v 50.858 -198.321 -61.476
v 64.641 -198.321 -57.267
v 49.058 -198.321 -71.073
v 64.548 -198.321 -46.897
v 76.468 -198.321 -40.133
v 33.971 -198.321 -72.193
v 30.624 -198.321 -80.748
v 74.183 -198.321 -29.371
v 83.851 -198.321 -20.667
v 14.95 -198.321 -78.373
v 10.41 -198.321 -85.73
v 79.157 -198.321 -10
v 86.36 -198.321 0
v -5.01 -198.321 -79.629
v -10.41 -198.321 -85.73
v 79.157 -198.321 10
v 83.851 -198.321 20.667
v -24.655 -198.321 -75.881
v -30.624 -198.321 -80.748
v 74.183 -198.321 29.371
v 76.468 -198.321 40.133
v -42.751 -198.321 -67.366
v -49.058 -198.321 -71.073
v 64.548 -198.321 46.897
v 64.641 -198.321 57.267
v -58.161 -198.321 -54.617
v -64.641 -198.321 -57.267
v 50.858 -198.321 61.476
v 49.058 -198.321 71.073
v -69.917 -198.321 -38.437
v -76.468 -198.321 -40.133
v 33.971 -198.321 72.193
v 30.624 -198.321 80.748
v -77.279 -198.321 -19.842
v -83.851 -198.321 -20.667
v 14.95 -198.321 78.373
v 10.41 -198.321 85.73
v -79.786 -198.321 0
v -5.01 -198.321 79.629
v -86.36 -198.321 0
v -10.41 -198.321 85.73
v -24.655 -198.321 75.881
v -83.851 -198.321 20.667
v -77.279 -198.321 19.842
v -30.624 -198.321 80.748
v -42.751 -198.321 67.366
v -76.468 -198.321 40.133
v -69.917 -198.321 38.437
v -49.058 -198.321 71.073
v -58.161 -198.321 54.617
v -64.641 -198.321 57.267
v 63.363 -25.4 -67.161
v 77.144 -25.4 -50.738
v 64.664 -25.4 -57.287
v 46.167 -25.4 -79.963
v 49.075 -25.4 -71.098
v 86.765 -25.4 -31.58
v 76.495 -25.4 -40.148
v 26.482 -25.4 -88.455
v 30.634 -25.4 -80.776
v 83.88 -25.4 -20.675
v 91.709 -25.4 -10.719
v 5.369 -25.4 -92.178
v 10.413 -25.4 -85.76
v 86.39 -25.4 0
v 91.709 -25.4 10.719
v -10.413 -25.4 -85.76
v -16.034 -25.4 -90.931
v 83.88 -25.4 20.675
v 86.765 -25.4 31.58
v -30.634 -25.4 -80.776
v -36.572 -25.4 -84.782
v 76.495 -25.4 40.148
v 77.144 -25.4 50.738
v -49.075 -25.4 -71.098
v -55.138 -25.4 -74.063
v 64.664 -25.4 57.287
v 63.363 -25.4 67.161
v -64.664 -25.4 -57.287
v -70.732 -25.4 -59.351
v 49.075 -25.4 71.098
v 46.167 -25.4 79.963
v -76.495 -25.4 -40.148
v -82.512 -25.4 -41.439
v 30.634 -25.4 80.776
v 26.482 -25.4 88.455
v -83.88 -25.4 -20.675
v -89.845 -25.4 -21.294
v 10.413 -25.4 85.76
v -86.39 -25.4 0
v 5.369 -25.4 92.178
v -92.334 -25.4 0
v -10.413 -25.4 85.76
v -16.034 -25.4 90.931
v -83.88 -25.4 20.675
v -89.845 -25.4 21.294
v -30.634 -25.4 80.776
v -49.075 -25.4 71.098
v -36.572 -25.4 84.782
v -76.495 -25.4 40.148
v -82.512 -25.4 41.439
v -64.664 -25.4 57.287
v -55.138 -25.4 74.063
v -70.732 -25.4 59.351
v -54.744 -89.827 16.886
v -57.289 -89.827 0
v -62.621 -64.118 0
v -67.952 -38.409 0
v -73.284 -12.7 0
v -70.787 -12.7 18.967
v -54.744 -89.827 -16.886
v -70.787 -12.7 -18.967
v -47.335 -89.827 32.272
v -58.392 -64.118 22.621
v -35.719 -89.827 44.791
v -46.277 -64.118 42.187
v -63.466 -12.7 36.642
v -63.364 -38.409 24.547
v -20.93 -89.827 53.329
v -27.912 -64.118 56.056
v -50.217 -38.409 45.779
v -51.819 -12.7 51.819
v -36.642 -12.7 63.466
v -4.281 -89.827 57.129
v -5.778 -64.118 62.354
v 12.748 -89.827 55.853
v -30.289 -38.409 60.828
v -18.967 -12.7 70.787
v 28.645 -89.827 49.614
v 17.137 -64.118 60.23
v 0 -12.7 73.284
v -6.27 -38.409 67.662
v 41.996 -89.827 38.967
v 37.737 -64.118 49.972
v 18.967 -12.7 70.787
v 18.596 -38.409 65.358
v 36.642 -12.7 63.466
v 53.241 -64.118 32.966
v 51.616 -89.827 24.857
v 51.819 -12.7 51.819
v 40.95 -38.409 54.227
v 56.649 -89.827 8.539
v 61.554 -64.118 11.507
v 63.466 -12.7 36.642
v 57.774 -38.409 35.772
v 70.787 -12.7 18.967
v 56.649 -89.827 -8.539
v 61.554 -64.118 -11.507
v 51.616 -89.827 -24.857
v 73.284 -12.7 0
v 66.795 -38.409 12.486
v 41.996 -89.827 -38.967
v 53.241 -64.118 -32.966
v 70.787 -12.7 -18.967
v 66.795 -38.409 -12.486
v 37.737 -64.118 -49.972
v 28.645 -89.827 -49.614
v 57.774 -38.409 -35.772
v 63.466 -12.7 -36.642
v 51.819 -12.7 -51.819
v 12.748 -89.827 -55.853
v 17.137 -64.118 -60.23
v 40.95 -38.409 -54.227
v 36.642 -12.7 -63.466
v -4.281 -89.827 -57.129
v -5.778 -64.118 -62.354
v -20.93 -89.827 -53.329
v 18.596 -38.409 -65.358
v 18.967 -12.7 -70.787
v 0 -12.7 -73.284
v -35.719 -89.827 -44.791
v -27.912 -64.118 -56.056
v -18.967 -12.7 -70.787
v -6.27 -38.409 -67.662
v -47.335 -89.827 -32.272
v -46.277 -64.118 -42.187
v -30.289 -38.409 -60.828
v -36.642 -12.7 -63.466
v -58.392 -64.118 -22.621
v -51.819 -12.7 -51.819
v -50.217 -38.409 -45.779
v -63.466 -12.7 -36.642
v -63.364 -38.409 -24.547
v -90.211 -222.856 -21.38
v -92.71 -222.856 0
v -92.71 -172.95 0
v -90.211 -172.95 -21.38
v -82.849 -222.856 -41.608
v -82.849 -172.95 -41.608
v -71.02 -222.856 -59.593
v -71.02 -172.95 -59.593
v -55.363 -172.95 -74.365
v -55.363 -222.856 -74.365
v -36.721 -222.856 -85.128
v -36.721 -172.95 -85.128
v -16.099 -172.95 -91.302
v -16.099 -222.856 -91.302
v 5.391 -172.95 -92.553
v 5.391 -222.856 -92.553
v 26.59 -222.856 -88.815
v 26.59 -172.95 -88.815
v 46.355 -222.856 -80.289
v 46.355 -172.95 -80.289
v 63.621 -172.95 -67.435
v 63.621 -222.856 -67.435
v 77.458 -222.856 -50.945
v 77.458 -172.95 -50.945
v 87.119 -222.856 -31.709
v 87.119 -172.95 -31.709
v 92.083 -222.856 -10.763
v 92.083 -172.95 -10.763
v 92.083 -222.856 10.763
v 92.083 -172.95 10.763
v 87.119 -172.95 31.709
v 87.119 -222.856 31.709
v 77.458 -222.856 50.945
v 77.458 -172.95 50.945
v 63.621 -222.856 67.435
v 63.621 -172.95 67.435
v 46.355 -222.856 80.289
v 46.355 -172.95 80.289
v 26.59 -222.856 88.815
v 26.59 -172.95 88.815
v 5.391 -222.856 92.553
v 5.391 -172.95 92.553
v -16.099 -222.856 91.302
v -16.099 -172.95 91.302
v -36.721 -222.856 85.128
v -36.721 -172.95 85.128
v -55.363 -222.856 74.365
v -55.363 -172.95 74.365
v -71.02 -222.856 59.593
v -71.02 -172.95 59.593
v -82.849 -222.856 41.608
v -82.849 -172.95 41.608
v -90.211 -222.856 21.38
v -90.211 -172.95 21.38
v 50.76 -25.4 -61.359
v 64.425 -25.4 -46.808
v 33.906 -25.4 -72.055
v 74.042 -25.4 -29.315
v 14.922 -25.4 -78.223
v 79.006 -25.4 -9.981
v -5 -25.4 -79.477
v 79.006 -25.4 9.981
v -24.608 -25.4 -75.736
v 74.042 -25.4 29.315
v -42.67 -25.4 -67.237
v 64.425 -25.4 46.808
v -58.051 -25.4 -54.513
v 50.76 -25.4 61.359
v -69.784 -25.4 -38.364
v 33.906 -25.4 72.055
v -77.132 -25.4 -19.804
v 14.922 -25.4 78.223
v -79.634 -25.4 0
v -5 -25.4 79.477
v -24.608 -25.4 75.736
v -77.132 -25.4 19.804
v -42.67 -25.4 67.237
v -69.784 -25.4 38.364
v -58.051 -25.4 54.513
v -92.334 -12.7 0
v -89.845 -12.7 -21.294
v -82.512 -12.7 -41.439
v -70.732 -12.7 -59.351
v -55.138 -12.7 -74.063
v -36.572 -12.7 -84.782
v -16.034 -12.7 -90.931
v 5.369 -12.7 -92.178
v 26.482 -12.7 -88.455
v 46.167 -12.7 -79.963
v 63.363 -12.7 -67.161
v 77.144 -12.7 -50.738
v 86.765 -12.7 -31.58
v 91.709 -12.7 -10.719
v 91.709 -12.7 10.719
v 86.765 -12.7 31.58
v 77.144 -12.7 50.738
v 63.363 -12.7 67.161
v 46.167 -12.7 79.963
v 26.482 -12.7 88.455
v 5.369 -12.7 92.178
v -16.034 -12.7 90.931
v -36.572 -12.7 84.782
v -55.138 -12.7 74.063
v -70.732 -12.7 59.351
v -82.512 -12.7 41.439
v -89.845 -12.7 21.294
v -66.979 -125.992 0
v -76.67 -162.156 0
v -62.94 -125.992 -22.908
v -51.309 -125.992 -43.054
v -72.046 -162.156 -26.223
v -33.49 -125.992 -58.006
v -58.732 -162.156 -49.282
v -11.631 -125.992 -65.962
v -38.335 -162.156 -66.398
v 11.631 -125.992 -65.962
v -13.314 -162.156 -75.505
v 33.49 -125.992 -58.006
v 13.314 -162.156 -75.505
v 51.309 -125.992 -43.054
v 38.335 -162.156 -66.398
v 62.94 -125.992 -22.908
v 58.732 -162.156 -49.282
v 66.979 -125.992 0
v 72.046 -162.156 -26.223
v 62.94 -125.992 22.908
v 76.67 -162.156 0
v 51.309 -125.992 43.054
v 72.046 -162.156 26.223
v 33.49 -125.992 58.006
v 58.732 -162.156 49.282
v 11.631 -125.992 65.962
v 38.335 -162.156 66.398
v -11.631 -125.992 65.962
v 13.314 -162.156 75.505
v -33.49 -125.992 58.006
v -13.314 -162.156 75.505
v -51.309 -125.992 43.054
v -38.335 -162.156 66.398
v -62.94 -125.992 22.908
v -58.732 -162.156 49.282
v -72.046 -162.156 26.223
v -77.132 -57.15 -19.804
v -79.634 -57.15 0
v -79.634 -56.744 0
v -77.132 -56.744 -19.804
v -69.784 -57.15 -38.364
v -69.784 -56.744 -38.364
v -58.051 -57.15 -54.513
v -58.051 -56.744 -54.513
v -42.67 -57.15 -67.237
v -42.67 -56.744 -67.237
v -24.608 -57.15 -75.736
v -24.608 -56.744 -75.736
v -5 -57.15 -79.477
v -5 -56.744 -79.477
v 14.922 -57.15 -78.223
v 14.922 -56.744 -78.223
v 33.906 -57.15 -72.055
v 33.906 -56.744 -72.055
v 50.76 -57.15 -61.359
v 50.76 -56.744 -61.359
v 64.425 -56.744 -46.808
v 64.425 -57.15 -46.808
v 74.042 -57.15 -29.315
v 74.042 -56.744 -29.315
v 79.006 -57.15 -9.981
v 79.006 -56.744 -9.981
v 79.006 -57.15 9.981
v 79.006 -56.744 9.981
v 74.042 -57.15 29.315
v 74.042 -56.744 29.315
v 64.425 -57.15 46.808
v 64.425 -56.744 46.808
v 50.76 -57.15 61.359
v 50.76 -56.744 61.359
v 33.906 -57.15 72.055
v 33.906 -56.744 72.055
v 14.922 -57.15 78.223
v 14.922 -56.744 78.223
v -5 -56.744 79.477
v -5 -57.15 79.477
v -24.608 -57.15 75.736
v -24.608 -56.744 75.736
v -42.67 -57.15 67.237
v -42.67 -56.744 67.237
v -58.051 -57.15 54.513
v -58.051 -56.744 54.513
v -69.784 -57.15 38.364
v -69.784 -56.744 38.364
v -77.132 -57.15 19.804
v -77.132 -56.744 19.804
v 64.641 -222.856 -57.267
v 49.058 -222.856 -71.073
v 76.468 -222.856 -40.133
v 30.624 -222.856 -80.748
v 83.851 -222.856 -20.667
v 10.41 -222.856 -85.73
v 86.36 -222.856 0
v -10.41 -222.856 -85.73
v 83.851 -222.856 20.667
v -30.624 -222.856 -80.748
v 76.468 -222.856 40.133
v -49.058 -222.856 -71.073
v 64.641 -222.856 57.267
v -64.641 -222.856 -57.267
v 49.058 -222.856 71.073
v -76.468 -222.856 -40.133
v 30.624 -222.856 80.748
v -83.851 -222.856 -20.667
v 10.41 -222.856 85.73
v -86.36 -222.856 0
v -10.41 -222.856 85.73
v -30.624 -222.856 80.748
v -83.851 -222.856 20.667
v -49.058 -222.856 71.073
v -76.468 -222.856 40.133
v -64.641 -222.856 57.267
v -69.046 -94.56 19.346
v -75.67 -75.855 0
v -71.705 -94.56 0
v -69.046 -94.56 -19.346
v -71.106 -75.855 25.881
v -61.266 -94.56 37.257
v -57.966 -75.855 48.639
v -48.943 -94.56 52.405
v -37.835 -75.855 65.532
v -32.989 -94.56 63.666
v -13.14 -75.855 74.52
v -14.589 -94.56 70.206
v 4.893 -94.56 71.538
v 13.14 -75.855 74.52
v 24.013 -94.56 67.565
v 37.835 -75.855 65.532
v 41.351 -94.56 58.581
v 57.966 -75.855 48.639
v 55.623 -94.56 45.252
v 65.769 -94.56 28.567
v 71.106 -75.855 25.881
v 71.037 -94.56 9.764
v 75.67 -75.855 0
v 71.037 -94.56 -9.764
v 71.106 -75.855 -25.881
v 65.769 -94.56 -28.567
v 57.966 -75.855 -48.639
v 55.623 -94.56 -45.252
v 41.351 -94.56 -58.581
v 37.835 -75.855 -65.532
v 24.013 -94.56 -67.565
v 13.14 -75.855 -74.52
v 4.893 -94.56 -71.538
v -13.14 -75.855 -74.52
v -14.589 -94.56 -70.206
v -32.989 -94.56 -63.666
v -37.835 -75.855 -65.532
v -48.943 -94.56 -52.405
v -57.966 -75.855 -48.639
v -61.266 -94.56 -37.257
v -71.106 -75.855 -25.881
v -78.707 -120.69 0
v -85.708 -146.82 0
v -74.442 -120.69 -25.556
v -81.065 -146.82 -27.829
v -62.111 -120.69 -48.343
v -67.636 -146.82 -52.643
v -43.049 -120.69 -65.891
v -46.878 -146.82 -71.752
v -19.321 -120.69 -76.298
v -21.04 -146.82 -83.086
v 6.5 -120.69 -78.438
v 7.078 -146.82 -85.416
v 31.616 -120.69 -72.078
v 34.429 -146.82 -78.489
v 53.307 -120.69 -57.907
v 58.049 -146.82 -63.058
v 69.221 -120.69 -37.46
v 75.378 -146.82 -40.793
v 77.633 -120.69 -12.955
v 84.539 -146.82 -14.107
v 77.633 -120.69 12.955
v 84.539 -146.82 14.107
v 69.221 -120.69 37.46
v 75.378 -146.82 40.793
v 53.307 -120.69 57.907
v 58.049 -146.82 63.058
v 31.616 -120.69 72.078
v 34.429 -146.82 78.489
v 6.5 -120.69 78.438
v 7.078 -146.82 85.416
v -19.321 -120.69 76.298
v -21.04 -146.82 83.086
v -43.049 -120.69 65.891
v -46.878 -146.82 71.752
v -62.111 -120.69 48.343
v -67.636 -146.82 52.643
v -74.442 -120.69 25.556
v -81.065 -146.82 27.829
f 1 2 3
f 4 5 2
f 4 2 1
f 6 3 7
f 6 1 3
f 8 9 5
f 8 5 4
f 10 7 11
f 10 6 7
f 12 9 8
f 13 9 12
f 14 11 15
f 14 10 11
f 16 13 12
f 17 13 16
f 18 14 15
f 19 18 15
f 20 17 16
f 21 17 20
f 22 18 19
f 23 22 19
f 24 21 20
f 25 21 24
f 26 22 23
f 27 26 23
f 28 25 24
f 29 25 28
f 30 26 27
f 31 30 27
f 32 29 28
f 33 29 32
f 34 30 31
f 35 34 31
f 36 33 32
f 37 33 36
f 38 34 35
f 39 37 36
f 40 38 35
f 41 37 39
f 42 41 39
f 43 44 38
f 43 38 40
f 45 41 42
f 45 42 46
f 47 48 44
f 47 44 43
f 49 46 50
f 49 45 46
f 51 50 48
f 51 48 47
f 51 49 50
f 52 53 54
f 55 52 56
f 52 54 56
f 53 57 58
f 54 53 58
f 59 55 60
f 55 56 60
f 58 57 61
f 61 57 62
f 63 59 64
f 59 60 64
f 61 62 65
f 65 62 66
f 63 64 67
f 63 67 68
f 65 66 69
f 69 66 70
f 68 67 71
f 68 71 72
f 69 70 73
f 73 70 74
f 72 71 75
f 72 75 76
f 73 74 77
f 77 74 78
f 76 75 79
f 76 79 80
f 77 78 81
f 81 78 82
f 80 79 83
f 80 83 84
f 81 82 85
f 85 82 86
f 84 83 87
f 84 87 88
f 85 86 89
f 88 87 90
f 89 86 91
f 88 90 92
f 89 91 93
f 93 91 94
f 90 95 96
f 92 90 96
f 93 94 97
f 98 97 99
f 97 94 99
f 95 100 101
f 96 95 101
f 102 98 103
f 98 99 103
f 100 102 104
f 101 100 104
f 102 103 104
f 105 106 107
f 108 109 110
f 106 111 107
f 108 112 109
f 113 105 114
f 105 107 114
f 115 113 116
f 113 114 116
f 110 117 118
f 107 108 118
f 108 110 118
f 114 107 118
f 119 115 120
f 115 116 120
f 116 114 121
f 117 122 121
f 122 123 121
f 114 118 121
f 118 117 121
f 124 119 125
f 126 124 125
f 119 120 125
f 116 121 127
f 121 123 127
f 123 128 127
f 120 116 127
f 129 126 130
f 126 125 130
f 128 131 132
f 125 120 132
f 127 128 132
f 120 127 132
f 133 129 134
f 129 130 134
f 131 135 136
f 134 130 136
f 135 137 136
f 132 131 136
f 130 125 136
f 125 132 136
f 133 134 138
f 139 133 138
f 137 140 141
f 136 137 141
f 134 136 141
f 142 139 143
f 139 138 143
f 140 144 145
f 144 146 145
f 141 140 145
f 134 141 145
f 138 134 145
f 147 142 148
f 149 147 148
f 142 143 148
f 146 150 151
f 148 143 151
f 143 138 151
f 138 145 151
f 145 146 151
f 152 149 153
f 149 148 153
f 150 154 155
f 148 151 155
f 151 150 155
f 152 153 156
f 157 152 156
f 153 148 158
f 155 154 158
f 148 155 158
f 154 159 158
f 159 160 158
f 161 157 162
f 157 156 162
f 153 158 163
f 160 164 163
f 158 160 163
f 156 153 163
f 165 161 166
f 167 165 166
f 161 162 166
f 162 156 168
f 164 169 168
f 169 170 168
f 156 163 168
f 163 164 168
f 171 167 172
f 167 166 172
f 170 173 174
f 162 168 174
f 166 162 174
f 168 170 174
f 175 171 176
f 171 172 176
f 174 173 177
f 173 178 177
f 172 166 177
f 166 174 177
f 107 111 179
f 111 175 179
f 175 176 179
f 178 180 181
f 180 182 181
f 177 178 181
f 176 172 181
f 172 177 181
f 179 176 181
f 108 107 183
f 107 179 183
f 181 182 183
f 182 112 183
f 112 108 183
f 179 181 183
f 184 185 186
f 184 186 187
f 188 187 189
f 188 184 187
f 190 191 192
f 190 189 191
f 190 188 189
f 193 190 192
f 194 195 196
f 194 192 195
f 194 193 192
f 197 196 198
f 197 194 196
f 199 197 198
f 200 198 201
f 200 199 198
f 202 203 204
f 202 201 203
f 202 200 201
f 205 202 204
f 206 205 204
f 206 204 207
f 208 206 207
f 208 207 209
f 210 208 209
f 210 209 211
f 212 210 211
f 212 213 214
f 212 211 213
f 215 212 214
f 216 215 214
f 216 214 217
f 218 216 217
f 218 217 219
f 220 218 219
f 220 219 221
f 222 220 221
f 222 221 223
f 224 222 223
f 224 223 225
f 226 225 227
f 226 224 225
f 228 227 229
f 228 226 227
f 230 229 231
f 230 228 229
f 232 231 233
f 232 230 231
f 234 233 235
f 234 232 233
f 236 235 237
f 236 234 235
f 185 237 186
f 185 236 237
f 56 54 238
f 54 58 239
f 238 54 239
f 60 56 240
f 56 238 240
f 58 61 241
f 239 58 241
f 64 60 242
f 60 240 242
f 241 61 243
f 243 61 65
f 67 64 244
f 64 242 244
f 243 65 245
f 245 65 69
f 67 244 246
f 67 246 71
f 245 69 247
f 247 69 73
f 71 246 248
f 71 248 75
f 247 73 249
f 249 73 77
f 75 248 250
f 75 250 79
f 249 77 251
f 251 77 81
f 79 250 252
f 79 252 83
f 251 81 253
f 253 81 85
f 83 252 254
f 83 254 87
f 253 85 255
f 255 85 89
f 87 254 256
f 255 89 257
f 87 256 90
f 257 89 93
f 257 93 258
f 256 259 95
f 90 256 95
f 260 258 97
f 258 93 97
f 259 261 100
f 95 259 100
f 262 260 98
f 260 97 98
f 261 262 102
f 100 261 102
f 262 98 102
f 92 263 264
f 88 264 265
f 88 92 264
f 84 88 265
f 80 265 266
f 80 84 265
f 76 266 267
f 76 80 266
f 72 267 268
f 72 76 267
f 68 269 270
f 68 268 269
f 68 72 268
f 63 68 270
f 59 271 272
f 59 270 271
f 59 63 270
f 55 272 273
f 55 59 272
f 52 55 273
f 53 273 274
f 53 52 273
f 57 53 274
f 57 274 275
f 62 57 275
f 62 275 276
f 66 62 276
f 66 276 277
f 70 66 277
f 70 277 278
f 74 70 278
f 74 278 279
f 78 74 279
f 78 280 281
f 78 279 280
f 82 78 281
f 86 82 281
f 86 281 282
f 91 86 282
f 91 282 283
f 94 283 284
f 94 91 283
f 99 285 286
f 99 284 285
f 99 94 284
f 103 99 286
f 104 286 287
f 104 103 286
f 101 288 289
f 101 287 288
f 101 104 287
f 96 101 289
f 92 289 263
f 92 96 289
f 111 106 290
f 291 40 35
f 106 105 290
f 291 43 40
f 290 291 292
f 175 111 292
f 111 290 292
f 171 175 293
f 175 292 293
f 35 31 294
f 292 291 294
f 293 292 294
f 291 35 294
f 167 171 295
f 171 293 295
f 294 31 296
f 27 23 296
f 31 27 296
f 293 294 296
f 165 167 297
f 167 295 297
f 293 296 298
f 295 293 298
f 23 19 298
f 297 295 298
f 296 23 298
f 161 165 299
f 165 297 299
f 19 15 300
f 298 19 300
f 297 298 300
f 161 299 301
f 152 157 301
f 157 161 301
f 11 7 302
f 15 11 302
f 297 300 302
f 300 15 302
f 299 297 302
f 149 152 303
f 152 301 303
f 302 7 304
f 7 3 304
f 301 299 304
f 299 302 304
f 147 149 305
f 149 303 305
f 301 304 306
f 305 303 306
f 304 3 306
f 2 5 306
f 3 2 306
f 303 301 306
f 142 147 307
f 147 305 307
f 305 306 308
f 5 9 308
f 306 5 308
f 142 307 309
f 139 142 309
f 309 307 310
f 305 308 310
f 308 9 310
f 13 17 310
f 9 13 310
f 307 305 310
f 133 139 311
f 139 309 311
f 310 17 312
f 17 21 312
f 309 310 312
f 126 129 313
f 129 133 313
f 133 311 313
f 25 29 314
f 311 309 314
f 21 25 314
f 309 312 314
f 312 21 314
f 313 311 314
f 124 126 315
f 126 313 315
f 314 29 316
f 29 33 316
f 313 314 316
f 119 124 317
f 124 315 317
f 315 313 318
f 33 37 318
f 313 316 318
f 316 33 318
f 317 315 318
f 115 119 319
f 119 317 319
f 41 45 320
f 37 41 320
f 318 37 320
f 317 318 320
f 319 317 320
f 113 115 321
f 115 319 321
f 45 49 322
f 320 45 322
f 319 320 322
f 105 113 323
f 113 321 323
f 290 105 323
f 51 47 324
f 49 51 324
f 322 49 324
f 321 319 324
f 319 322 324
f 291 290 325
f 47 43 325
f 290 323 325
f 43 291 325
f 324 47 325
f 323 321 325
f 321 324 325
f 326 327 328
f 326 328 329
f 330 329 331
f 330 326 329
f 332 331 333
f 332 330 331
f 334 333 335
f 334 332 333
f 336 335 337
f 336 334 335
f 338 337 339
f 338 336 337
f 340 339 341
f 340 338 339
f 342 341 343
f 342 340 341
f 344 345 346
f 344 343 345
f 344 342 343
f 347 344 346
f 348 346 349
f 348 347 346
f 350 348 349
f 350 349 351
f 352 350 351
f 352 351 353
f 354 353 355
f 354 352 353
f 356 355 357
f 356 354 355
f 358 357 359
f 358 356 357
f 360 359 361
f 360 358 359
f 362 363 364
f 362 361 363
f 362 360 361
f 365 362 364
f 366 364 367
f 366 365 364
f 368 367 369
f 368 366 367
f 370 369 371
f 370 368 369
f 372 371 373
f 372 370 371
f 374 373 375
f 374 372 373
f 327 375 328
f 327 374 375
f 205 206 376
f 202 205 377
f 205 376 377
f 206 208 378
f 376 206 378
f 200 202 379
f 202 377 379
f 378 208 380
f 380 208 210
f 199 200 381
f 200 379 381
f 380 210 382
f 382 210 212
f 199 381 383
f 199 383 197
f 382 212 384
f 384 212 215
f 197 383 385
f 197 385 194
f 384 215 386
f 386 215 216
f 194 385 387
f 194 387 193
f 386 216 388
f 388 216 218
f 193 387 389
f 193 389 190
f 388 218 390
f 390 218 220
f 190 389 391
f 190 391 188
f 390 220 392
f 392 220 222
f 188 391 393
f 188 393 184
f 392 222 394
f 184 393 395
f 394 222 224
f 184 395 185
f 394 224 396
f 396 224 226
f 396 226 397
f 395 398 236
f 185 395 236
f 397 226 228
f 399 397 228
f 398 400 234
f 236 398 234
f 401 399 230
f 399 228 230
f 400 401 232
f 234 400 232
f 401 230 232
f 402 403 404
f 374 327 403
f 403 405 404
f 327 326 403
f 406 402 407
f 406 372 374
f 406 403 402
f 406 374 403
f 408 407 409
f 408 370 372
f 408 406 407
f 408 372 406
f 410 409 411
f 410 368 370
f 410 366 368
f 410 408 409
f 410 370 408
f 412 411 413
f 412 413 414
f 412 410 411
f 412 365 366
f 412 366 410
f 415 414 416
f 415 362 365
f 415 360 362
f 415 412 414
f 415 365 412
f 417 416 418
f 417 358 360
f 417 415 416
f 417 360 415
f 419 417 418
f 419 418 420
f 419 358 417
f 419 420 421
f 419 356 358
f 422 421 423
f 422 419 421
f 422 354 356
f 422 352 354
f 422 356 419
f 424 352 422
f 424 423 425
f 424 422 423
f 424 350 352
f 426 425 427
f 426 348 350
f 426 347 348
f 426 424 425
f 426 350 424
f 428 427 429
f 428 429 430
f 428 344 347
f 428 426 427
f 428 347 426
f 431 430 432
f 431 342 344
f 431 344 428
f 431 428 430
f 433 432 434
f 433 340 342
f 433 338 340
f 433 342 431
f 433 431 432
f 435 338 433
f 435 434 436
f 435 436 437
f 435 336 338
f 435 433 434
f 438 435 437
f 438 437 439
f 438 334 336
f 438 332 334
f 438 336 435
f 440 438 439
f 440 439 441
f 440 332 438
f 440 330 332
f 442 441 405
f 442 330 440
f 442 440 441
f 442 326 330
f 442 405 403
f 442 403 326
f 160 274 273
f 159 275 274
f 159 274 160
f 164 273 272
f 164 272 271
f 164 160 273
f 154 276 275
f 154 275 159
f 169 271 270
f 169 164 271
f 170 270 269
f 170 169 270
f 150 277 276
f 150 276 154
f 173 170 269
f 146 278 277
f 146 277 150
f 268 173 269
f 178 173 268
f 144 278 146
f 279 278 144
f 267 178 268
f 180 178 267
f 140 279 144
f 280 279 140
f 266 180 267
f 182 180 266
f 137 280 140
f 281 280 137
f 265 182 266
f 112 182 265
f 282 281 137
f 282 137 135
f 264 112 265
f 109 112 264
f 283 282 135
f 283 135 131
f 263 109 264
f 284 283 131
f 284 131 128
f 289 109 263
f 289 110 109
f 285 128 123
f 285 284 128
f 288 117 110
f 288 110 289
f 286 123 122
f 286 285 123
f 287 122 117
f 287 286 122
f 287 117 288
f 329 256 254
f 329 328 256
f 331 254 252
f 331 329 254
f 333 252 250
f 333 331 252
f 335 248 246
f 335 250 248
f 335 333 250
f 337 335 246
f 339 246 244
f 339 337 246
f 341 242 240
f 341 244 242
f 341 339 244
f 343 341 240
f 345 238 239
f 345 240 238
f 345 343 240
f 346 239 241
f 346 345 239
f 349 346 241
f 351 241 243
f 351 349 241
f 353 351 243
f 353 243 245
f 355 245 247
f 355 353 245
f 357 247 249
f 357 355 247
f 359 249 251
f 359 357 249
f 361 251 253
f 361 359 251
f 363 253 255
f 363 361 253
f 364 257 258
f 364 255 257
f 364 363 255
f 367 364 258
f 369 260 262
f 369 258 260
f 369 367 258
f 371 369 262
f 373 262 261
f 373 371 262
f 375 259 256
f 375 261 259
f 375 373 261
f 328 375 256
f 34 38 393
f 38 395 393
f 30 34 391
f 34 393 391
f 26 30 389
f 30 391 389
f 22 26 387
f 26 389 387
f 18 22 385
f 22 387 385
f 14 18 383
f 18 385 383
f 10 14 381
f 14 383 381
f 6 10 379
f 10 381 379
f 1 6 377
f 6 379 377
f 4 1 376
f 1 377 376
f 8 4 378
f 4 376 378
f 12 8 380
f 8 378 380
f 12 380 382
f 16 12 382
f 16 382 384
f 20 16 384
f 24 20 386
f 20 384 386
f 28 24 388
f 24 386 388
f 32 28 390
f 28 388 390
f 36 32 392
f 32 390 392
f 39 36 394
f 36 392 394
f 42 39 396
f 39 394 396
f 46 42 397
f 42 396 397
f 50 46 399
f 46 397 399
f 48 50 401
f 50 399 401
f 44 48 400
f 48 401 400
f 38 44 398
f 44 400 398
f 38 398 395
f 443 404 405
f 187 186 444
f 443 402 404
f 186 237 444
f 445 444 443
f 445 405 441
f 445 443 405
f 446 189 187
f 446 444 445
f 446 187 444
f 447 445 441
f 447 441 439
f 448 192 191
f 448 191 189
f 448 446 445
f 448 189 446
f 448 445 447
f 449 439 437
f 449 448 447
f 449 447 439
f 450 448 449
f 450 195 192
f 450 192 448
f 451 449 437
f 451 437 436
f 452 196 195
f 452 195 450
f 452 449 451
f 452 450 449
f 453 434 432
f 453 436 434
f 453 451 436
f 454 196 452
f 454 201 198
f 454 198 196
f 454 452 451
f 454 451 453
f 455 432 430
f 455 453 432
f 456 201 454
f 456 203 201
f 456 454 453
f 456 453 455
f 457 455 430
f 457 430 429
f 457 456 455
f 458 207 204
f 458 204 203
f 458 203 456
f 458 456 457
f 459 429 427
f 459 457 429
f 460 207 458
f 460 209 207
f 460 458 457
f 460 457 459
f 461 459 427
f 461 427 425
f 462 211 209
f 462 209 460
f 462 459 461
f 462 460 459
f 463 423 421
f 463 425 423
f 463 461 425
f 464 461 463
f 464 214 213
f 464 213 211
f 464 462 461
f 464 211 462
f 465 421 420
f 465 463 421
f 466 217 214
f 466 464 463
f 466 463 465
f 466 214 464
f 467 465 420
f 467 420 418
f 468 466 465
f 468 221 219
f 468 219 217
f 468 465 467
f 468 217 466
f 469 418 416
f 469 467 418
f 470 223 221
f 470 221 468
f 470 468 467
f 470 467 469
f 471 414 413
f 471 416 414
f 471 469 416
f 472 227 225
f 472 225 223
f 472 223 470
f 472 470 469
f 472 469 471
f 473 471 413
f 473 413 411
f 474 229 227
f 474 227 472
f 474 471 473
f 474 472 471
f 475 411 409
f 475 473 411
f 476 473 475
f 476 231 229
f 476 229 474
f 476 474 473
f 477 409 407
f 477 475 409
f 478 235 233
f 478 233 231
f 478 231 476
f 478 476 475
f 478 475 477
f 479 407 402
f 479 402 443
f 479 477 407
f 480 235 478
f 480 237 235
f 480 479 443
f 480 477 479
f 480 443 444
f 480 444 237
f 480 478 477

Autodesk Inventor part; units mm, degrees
ref_plane "YZ Plane" through (0, 0, 0) normal (1, 0, 0) x (0, 1, 0)
ref_plane "XZ Plane" through (0, 0, 0) normal (0, 1, 0) x (-1, 0, 0)
ref_plane "XY Plane" through (0, 0, 0) normal (0, 0, 1) x (1, 0, 0)
sketch "Sketch1" plane through (0, 0, 0) normal (0, 0, 1) x (1, 0, 0)
  line L0 (0, 25.4) -> (-28.702, 25.4) construction
  line L1 (0, 25.4) -> (-95.25, 25.4) construction
  line L2 (-95.25, 25.4) -> (-89.1588, 25.4) construction
  line L3 (-89.1588, 25.4) -> (-85.693, 23.7839) construction
  line L4 (-89.1588, 25.4) -> (-89.1588, 21.1626) construction
  line L5 (-89.1588, 0) -> (-95.25, 0)
  line L6 (-28.702, 59.6457) -> (-28.702, -91.9304) construction
  arc A0 (-28.9184, -8.4804) -> (-32.3684, -1.0818) centre (-35.052, -6.8369) ccw
  line L7 (-89.1588, 25.4) -> (-89.1588, 0)
  line L8 (-89.1588, 25.4) -> (-32.3684, -1.0818)
  line L9 (-28.9184, -8.4804) -> (-28.9392, -8.5583)
  line L10 (0, -319.0244) -> (0, 122.7573) projected
  line L11 (-73.152, 17.9359) -> (-28.702, 17.9359) construction
  line L12 (-89.1588, 0) -> (-92.3338, 0)
  line L13 (11.4547, -6.8369) -> (-136.2084, -6.8369) construction
  line L14 (-57.2892, -89.8271) -> (-86.36, -198.3209)
  line L15 (-92.3338, -12.7) -> (-73.2838, -12.7)
  line L16 (-73.2838, -12.7) -> (-54.421, -103.6575)
  line L17 (-92.71, -222.8555) -> (-86.36, -222.8555)
  line L18 (-86.36, -198.3209) -> (-79.786, -198.3209)
  line L19 (-92.71, -172.9504) -> (-71.7053, -94.5599)
  line L20 (-92.3338, -25.4) -> (-79.6338, -25.4)
  line L21 (-79.6338, -25.4) -> (-79.6338, -57.15)
  line L22 (-79.6338, -57.15) -> (-71.7053, -94.5599)
  line L23 (-92.3338, 0) -> (-92.3338, -25.4)
  line L24 (-92.71, -172.9504) -> (-92.71, -222.8555)
  line L25 (-86.3902, -25.4) -> (-86.3902, -31.3436)
  line L26 (-86.3902, -31.3436) -> (-92.3338, -31.3436)
  line L27 (-92.3338, -31.3436) -> (-92.3338, -56.7436)
  line L28 (-92.3338, -56.7436) -> (-79.6338, -56.7436)
  line L29 (-73.152, 17.9359) -> (-32.3684, -1.0818)
  line L30 (-73.152, 17.9359) -> (-50.7653, -90.0141)
  line L31 (-50.7653, -90.0141) -> (-28.9184, -8.4804)
  line L32 (-52.4654, -96.3589) -> (-28.9184, -8.4804)
  line L33 (-86.36, -222.8555) -> (-28.9184, -8.4804)
  point P0 (0, 0)
  point P1 (-95.25, -255.9127)
  point P2 (-88.7095, 22.4389)
  dimension "d0" = 28.702
  dimension "d3" = 25
  dimension "d5" = 25.4
  dimension "d6" = 25.4
  dimension "d8" = 12.7
  dimension "d34" = 15
  dimension "d37" = 44.45
  dimension "d46" = 19.05
  dimension "d47" = 12.7
  dimension "d50" = 86.36
  dimension "d53" = 12.7
  dimension "d55" = 12.7
  dimension "d56" = 31.75
  dimension "d58" = 0.25
  dimension "d60" = 12.7
  dimension "d61" = 25.4
  dimension "d62" = 5.9436
  dimension "d63" = 5.9436
  dimension "d64" = 3.175
  dimension "d65" = 6.35
  dimension "d67" = 6.35
  dimension "d68" = 107.95
  dimension "d69" = 6.35
  dimension "d70" = 6.35
revolve "Revolution2" add sketch "Sketch1" angle 360 about axis through (0, -10, 0) along (0, 1, 0) contours L15 L16 L14 L18 L33 L17 L24 L19 L22 L21 L20 L23
properties part number "aluminum" material "Aluminum 6061"
